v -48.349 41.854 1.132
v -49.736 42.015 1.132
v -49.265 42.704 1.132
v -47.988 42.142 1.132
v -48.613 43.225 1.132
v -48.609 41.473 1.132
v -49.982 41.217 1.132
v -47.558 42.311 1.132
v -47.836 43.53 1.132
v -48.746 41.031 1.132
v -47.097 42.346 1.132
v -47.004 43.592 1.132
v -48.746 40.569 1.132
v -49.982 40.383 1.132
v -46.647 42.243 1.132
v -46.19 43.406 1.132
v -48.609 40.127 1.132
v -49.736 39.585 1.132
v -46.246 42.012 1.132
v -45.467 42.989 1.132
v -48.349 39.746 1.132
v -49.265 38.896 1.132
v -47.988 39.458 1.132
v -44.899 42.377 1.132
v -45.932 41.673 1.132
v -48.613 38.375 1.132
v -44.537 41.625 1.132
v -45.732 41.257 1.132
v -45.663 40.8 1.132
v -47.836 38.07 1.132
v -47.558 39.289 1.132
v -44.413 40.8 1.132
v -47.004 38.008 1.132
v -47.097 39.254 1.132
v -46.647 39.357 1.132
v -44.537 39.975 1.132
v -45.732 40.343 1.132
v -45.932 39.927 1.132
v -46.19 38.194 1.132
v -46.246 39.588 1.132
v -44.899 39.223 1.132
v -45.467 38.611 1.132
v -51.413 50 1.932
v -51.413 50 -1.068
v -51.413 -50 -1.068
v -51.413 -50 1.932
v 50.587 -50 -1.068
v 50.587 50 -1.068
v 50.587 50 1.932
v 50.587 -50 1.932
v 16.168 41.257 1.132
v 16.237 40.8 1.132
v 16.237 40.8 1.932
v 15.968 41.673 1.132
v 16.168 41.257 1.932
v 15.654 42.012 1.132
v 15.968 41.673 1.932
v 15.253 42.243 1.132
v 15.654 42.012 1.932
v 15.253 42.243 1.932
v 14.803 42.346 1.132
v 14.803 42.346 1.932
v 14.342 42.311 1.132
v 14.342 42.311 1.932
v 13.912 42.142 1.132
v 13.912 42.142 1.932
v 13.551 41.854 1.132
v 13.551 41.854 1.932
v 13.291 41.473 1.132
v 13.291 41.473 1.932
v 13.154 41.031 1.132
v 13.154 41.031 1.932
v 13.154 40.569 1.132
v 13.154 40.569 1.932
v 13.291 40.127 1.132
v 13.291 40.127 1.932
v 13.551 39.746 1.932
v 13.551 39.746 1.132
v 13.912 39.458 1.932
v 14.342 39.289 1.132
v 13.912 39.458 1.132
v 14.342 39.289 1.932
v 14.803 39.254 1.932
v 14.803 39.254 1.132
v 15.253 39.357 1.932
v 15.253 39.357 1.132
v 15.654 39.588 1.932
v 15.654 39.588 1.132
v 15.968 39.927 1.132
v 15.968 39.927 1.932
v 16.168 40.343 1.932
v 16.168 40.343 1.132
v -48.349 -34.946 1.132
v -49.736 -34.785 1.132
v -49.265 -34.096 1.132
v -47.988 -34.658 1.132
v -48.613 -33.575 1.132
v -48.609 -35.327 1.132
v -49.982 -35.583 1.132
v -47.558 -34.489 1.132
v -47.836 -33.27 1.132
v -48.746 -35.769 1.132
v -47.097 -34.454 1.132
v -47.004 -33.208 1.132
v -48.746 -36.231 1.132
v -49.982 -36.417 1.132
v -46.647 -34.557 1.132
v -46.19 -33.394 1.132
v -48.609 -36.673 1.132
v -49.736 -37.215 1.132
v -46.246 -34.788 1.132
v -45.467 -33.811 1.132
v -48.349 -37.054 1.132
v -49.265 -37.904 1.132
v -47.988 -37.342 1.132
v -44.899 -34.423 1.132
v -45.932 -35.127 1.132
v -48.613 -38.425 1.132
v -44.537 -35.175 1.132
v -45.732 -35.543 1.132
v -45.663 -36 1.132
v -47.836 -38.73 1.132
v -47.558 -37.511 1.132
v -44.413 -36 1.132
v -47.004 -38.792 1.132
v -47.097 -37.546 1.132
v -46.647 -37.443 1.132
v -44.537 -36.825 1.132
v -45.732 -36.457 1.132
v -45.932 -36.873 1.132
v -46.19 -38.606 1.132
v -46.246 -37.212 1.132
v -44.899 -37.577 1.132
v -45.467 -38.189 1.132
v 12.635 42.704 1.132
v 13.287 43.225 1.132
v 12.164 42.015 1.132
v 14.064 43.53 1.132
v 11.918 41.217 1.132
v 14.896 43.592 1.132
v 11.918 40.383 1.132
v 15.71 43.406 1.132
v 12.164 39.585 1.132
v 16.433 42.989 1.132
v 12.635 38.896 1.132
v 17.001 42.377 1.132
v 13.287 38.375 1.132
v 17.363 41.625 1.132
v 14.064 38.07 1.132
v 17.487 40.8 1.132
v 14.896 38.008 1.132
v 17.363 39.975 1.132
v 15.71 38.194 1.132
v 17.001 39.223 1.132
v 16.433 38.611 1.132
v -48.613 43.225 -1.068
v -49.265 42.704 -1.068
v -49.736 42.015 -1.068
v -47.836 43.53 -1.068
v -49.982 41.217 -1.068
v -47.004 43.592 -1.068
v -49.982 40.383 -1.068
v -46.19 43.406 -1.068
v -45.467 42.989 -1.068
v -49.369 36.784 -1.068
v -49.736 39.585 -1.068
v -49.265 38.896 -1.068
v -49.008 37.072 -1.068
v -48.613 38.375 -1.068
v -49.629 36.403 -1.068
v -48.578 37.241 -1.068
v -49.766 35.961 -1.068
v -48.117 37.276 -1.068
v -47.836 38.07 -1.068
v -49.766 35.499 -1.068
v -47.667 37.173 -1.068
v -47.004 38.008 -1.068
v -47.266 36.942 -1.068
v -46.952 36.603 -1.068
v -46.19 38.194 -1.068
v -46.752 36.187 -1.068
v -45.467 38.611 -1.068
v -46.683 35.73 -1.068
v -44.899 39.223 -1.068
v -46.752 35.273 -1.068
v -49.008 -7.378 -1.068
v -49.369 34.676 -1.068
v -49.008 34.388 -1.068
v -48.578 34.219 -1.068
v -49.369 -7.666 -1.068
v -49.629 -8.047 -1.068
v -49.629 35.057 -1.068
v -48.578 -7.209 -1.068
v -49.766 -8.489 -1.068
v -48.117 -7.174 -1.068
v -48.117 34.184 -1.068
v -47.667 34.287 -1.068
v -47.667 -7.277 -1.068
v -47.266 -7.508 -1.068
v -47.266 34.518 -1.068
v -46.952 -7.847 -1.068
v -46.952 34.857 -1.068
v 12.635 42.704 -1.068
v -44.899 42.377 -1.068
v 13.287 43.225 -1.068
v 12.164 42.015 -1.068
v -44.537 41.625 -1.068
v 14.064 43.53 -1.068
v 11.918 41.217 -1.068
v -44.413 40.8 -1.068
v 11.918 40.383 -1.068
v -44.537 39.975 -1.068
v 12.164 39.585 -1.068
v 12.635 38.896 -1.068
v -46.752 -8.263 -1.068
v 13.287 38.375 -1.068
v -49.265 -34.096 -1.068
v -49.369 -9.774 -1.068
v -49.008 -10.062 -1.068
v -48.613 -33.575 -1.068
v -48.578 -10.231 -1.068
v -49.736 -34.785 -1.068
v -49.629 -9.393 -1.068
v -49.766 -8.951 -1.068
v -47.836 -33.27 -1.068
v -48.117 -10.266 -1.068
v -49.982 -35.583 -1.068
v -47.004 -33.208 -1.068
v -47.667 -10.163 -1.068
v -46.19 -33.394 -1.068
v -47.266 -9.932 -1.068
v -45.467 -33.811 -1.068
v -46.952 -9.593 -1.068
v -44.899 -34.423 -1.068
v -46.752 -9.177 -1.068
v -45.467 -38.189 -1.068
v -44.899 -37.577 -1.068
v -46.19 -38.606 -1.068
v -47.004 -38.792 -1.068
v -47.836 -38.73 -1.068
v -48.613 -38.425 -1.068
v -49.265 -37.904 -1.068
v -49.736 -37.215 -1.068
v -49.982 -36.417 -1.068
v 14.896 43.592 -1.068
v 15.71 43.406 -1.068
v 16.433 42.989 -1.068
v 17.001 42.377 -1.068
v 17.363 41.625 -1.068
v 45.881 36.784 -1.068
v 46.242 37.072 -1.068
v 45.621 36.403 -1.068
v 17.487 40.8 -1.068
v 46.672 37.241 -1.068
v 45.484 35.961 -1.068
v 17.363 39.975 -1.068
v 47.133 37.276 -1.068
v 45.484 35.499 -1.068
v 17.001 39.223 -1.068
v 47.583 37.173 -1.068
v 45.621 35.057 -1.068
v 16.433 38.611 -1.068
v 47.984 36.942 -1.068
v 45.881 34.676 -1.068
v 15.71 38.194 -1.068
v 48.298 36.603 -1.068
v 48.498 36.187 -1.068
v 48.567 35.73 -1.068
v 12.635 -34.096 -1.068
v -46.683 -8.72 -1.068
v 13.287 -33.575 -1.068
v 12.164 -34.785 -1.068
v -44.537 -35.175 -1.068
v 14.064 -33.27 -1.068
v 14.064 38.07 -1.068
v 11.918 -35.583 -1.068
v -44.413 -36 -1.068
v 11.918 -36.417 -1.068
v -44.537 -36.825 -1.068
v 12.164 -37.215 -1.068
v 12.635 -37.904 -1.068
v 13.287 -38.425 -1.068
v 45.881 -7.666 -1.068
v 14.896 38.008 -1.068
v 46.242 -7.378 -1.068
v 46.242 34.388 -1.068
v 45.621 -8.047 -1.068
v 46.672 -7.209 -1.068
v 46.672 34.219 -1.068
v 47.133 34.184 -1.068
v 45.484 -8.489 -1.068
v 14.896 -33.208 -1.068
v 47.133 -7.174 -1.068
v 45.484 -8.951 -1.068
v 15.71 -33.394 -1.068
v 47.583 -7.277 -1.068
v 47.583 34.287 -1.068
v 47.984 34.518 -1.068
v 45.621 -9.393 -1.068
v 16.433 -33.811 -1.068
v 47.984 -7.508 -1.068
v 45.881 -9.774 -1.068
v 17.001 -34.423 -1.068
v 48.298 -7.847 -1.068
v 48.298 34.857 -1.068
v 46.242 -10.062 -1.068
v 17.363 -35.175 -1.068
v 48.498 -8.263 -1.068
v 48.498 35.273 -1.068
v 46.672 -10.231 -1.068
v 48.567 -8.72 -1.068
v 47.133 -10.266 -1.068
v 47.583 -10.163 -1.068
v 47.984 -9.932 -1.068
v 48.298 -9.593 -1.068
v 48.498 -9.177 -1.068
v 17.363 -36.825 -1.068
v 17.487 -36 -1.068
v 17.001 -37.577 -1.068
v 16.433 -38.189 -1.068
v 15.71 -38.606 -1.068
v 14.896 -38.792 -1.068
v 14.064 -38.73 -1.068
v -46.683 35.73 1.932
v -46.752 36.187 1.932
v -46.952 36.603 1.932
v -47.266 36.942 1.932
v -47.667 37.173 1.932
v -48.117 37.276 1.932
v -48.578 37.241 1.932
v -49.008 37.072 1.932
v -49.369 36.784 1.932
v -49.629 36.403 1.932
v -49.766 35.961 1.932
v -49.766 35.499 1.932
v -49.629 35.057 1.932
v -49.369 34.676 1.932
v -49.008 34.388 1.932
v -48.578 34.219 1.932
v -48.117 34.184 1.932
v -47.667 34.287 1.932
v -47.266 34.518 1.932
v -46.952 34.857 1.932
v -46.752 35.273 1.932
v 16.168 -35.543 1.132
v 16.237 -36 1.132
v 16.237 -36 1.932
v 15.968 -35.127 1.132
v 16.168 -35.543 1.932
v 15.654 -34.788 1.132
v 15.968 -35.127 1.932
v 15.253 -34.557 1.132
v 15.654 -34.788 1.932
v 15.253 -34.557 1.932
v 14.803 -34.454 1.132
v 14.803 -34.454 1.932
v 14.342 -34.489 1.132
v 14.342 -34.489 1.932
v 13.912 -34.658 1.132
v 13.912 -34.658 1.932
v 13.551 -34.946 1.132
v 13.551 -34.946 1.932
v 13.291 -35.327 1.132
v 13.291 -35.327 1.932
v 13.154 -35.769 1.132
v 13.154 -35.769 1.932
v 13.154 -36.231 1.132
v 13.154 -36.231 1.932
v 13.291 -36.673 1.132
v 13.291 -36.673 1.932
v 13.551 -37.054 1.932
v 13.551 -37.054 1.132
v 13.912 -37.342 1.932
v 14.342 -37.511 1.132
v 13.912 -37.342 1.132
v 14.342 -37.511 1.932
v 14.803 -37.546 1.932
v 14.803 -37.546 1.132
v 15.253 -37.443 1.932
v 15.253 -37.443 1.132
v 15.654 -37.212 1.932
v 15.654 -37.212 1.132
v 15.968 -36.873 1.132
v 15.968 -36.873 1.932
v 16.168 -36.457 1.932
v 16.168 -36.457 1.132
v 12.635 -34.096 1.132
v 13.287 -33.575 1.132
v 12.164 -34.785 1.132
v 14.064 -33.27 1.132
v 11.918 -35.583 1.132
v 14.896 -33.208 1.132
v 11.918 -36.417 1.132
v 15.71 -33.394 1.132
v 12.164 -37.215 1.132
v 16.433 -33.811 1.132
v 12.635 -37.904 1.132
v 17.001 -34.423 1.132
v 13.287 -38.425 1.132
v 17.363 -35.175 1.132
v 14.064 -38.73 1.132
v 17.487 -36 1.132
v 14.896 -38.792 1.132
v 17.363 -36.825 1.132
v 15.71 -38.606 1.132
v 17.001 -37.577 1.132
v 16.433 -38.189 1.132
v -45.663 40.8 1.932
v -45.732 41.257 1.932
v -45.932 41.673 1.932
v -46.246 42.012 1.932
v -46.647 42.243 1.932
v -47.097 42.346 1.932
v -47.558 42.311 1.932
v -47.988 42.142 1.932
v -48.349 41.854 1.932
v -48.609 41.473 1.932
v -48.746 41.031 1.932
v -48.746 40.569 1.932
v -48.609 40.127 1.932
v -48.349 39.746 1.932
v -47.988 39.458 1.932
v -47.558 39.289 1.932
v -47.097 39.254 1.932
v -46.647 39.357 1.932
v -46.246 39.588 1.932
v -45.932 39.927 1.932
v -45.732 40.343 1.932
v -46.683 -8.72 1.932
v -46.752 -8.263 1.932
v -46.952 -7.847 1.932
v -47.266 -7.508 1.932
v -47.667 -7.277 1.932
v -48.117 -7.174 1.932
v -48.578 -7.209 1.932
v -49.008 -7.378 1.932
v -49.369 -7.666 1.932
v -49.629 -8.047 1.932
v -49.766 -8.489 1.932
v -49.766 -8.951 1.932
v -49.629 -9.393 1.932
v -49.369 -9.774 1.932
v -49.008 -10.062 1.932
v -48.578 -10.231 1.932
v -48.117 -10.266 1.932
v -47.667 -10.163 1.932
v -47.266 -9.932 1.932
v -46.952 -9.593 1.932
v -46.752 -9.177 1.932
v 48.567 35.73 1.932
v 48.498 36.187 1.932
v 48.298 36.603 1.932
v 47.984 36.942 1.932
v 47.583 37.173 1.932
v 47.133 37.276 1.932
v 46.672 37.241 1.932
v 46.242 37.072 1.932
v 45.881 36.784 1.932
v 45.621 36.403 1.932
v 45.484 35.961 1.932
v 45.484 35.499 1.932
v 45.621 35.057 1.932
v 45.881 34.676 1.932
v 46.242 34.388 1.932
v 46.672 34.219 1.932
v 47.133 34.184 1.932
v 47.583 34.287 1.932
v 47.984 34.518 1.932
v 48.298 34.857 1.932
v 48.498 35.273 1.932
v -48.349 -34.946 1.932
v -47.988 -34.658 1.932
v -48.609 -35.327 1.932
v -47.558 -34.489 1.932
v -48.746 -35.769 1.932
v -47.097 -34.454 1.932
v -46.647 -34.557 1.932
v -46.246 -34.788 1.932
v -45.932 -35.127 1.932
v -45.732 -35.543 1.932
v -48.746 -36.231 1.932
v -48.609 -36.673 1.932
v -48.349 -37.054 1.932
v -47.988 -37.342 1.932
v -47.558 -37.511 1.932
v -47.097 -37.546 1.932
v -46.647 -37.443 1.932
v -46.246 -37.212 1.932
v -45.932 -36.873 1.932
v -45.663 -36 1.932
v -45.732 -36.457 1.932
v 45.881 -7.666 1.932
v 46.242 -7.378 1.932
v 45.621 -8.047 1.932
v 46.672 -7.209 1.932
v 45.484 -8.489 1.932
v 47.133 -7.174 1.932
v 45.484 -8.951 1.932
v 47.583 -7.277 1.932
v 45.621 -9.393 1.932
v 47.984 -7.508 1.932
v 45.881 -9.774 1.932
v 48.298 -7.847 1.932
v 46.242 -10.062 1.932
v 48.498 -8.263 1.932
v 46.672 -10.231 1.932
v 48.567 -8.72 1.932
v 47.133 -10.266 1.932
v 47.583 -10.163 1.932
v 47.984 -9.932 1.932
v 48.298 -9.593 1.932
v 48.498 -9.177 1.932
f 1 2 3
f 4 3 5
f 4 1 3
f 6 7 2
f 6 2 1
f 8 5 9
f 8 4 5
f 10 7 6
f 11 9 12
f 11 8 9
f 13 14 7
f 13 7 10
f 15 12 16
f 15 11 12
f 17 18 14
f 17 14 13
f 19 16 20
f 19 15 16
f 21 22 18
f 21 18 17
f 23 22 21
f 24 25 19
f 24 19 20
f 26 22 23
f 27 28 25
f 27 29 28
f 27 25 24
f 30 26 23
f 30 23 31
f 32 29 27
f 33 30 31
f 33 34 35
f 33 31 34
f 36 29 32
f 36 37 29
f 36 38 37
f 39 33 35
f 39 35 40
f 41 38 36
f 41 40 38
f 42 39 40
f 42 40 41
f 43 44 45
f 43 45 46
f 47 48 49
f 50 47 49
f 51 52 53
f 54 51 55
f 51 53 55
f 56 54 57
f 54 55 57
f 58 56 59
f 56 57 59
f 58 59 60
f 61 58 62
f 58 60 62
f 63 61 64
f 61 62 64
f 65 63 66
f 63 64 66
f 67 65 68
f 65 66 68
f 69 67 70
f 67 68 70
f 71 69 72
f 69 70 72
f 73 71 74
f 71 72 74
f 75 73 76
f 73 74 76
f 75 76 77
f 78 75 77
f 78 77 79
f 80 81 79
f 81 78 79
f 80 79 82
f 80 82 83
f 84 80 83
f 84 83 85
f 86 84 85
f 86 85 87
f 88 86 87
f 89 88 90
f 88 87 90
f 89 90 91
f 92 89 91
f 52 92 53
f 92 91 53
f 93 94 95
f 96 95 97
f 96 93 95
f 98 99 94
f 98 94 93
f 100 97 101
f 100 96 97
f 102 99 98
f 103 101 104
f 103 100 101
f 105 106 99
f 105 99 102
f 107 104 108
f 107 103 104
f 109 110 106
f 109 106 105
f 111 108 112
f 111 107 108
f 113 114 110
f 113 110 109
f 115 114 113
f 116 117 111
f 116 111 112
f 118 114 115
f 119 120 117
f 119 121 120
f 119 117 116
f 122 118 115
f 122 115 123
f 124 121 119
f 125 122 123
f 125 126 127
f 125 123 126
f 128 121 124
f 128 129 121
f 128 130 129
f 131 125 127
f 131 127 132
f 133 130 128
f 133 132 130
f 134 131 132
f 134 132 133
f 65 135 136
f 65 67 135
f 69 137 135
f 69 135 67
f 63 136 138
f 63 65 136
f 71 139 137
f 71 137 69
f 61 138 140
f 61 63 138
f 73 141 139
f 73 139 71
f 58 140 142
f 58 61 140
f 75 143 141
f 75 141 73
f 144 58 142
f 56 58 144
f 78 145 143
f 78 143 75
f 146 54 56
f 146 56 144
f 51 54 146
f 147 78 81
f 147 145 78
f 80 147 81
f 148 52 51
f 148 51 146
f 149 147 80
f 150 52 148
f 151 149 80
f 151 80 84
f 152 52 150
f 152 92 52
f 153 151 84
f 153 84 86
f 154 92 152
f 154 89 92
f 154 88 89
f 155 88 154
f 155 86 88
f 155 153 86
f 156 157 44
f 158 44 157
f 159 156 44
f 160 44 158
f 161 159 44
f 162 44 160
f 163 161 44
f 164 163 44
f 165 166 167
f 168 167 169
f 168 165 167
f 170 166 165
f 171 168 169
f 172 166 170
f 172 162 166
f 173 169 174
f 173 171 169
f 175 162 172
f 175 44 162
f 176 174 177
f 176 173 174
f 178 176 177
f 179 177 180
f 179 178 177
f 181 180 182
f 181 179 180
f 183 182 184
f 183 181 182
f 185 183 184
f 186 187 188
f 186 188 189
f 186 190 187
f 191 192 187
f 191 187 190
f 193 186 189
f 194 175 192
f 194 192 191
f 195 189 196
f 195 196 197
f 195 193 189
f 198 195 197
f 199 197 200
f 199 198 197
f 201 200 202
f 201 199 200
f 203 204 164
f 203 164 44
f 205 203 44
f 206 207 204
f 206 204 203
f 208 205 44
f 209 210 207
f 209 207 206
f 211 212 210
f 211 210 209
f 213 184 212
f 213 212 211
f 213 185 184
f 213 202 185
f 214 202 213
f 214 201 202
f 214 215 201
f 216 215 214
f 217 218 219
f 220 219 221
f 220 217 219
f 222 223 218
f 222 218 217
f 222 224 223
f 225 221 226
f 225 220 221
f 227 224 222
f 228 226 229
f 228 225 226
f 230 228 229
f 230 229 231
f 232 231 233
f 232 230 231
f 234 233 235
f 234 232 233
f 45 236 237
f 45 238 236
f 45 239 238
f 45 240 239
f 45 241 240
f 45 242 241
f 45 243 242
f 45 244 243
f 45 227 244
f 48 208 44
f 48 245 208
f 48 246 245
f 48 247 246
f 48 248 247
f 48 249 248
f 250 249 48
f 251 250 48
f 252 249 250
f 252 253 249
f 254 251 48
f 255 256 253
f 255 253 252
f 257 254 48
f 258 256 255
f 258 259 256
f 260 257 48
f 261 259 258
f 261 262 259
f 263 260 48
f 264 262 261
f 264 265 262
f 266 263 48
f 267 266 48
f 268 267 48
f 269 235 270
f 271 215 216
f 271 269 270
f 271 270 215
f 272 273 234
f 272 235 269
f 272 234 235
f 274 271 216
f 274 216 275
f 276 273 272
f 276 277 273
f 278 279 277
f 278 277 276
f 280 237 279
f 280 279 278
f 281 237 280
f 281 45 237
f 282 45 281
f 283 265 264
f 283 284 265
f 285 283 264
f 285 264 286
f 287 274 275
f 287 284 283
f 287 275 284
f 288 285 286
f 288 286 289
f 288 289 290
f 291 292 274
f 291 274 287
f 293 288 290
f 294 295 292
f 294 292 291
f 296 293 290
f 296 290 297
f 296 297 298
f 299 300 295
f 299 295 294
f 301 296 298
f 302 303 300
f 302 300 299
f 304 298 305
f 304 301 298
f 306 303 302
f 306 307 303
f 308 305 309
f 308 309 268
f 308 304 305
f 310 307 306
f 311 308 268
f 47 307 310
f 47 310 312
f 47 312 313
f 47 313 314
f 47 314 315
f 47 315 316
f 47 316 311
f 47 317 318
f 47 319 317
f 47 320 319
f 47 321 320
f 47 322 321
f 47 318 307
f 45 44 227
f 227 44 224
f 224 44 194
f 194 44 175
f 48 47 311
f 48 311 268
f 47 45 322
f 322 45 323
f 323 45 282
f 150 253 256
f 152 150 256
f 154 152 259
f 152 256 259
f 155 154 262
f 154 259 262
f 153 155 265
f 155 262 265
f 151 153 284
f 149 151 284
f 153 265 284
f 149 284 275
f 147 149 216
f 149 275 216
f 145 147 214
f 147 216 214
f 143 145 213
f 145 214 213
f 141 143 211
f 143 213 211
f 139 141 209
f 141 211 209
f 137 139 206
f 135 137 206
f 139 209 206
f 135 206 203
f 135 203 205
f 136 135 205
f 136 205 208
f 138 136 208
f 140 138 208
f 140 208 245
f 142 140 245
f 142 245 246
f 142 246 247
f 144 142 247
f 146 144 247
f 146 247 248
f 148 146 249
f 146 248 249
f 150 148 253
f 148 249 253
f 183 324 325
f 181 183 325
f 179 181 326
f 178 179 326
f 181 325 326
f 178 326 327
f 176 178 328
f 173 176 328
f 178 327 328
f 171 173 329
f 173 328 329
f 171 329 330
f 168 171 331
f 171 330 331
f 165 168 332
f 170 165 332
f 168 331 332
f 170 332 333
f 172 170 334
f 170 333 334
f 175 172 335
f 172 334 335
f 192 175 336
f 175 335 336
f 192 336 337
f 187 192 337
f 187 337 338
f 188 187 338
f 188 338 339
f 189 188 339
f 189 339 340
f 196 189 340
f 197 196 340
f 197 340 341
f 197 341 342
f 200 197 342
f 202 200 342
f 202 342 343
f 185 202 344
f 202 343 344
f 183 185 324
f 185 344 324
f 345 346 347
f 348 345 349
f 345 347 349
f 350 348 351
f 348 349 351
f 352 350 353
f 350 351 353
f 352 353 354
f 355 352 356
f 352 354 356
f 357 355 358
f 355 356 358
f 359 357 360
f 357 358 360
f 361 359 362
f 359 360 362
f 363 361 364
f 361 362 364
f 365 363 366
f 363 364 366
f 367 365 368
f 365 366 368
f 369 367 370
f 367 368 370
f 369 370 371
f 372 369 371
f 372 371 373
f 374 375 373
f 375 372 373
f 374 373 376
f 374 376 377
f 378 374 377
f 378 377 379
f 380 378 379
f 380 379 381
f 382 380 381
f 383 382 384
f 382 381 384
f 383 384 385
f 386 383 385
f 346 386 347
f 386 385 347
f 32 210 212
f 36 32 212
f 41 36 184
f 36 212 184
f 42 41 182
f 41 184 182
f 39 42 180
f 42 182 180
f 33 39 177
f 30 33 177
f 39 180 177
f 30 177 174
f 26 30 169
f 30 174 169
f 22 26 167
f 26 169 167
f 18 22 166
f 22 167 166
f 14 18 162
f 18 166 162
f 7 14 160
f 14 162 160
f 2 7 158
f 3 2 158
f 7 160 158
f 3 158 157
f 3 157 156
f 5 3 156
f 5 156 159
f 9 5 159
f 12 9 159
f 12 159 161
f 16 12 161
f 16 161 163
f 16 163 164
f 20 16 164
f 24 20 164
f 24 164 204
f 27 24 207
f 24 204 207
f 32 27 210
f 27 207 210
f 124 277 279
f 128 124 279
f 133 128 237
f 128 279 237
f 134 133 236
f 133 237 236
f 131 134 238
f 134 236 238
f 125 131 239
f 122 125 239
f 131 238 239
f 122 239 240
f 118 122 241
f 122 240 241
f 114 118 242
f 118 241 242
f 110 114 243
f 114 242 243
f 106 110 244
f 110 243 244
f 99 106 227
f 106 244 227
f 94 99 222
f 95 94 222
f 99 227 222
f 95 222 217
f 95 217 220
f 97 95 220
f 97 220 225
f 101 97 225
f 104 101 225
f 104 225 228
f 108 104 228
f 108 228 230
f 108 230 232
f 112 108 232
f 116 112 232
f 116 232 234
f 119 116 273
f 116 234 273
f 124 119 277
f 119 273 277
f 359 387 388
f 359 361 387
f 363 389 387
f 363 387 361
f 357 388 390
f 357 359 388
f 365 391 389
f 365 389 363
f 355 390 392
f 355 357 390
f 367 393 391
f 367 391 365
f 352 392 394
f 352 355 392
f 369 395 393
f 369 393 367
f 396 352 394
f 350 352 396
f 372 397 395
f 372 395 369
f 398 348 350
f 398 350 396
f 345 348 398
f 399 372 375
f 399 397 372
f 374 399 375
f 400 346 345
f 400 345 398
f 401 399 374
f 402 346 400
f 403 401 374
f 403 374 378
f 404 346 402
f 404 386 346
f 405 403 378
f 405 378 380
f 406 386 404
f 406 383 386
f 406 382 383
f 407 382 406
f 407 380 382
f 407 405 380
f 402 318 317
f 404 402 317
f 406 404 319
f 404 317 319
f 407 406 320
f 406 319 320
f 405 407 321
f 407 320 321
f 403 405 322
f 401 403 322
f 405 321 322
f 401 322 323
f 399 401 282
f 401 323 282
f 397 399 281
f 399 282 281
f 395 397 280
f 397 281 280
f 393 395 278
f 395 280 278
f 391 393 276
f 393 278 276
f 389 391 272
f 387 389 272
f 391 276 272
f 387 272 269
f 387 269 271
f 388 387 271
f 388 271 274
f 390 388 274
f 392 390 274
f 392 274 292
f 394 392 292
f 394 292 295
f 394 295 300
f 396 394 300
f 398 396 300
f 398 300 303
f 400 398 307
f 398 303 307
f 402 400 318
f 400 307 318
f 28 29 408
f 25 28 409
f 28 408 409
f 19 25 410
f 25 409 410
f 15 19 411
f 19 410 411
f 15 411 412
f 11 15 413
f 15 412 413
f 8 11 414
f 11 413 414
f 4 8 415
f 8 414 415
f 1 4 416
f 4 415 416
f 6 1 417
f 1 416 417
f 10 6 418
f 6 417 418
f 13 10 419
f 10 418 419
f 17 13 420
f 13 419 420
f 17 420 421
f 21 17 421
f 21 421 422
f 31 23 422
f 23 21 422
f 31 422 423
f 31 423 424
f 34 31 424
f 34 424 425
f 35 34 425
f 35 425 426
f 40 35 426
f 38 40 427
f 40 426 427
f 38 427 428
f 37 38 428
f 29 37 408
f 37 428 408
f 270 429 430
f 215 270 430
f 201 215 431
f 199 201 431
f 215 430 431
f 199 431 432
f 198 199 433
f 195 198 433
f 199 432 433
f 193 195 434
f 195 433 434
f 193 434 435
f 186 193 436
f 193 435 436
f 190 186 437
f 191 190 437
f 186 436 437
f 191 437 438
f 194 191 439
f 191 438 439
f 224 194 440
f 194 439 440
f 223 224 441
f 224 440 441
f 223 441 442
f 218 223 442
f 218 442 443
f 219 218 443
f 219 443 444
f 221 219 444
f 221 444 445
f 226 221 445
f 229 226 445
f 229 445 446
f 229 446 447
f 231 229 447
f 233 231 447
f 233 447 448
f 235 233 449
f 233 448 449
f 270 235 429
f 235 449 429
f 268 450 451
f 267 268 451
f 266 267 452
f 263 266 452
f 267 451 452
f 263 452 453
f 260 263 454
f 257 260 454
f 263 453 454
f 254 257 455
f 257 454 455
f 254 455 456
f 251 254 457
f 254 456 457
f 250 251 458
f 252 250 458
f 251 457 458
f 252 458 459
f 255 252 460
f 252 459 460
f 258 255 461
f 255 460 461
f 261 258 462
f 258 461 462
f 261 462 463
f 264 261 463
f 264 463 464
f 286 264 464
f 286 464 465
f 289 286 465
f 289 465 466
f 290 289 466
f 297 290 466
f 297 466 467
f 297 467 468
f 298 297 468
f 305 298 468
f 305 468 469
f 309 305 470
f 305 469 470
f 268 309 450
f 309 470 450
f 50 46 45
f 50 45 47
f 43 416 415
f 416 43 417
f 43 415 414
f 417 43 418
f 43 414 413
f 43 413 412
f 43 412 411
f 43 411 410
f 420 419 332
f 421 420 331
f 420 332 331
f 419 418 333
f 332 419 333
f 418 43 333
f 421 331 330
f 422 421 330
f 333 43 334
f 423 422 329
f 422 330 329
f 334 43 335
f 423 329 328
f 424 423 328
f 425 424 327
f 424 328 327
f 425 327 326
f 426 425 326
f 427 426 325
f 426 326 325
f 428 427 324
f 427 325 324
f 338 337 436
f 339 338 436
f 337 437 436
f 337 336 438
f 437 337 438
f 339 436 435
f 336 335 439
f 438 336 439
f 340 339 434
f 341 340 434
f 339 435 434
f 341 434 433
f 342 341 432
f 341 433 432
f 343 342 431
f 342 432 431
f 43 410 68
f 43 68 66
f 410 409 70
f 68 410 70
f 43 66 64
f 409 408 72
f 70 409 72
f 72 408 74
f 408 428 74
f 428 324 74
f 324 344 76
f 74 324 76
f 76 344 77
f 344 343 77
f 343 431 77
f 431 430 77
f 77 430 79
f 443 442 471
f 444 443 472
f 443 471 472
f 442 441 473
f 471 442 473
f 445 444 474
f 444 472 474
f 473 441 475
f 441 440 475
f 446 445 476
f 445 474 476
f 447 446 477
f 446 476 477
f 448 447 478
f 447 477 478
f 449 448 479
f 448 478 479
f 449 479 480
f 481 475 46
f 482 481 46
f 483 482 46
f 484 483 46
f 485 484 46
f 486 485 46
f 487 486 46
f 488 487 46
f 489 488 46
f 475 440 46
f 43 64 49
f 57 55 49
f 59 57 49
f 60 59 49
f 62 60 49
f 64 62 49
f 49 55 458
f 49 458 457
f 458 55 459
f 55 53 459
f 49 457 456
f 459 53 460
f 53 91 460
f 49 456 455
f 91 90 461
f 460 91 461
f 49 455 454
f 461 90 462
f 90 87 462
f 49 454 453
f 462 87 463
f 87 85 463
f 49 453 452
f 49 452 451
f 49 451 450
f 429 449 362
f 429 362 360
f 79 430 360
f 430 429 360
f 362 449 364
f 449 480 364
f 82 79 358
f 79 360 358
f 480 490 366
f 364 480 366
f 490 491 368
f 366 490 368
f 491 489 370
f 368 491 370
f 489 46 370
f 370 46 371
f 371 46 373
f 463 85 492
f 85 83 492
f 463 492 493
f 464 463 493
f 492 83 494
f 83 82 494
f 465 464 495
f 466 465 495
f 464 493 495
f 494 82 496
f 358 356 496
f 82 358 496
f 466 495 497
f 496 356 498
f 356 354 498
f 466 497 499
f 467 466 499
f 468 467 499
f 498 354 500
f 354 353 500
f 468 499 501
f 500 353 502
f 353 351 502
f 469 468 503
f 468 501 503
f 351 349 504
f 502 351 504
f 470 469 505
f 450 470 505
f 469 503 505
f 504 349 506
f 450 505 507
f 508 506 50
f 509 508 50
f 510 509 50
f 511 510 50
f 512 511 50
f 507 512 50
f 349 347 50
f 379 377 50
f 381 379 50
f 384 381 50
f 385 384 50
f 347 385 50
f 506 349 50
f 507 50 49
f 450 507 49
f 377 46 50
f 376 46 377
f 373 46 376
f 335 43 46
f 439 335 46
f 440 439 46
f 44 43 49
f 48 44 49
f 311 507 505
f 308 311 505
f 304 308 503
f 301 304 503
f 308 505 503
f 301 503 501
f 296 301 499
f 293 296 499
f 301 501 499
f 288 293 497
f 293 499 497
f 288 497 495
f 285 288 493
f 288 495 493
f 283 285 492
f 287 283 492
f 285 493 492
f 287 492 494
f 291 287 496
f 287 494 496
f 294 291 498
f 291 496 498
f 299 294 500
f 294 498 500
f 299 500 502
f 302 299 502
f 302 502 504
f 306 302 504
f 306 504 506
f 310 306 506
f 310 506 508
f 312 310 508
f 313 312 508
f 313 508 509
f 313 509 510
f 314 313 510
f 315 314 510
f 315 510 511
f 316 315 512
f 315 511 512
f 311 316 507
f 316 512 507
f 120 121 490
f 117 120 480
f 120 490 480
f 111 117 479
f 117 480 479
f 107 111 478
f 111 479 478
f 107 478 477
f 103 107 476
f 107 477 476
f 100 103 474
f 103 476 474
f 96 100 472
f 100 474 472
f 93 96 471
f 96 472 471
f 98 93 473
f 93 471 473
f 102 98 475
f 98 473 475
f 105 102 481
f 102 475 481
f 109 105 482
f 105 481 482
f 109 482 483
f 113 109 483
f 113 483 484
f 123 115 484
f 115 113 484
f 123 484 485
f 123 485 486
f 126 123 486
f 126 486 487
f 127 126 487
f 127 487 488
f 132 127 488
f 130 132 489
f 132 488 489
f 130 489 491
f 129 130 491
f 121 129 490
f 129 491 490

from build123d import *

# Parameters (mm, degrees)
F0_W     = 102
F0_H     = 3
F1_DEPTH = 50
F2_R     = 1.55
F3_DEPTH = 3
F4_R     = 2.8
F4_R_2   = 1.55
F5_DEPTH = 2.2


with BuildPart() as f1:
    # F0 (on Front) → F1 (new body, symmetric)
    with BuildSketch(Plane.XZ):
        with Locations((-0.412815, 0.432225)):
            Rectangle(F0_W, F0_H)
    extrude(amount=F1_DEPTH, both=True)

    # F2 (on face) → F3 (cut, through all)
    with BuildSketch(Plane.XY.offset(1.932225)):
        with Locations((-47.212815, 40.8)):
            Circle(F2_R)
        with Locations((14.687185, 40.8)):
            Circle(F2_R)
        with Locations((14.687185, -36)):
            Circle(F2_R)
        with Locations((-47.212815, -36)):
            Circle(F2_R)
        with Locations((-48.232815, 35.73)):
            Circle(F2_R)
        with Locations((-48.232815, -8.72)):
            Circle(F2_R)
        with Locations((47.017185, -8.72)):
            Circle(F2_R)
        with Locations((47.017185, 35.73)):
            Circle(F2_R)
    extrude(amount=-F3_DEPTH, mode=Mode.SUBTRACT)

    # F4 (on face) → F5 (cut)
    with BuildSketch(Plane(origin=(0, 0, -1.067775), x_dir=(1, 0, 0), z_dir=(0, 0, -1))):
        with Locations((-47.212815, 36)):
            Circle(F4_R)
        with Locations((-47.212815, 36)):
            Circle(F4_R_2, mode=Mode.SUBTRACT)
        with Locations((14.687185, 36)):
            Circle(F4_R)
        with Locations((14.687185, 36)):
            Circle(F4_R_2, mode=Mode.SUBTRACT)
        with Locations((-47.212815, -40.8)):
            Circle(F4_R)
        with Locations((-47.212815, -40.8)):
            Circle(F4_R_2, mode=Mode.SUBTRACT)
        with Locations((14.687185, -40.8)):
            Circle(F4_R)
        with Locations((14.687185, -40.8)):
            Circle(F4_R_2, mode=Mode.SUBTRACT)
    extrude(amount=-F5_DEPTH, mode=Mode.SUBTRACT)


solid = f1.part
